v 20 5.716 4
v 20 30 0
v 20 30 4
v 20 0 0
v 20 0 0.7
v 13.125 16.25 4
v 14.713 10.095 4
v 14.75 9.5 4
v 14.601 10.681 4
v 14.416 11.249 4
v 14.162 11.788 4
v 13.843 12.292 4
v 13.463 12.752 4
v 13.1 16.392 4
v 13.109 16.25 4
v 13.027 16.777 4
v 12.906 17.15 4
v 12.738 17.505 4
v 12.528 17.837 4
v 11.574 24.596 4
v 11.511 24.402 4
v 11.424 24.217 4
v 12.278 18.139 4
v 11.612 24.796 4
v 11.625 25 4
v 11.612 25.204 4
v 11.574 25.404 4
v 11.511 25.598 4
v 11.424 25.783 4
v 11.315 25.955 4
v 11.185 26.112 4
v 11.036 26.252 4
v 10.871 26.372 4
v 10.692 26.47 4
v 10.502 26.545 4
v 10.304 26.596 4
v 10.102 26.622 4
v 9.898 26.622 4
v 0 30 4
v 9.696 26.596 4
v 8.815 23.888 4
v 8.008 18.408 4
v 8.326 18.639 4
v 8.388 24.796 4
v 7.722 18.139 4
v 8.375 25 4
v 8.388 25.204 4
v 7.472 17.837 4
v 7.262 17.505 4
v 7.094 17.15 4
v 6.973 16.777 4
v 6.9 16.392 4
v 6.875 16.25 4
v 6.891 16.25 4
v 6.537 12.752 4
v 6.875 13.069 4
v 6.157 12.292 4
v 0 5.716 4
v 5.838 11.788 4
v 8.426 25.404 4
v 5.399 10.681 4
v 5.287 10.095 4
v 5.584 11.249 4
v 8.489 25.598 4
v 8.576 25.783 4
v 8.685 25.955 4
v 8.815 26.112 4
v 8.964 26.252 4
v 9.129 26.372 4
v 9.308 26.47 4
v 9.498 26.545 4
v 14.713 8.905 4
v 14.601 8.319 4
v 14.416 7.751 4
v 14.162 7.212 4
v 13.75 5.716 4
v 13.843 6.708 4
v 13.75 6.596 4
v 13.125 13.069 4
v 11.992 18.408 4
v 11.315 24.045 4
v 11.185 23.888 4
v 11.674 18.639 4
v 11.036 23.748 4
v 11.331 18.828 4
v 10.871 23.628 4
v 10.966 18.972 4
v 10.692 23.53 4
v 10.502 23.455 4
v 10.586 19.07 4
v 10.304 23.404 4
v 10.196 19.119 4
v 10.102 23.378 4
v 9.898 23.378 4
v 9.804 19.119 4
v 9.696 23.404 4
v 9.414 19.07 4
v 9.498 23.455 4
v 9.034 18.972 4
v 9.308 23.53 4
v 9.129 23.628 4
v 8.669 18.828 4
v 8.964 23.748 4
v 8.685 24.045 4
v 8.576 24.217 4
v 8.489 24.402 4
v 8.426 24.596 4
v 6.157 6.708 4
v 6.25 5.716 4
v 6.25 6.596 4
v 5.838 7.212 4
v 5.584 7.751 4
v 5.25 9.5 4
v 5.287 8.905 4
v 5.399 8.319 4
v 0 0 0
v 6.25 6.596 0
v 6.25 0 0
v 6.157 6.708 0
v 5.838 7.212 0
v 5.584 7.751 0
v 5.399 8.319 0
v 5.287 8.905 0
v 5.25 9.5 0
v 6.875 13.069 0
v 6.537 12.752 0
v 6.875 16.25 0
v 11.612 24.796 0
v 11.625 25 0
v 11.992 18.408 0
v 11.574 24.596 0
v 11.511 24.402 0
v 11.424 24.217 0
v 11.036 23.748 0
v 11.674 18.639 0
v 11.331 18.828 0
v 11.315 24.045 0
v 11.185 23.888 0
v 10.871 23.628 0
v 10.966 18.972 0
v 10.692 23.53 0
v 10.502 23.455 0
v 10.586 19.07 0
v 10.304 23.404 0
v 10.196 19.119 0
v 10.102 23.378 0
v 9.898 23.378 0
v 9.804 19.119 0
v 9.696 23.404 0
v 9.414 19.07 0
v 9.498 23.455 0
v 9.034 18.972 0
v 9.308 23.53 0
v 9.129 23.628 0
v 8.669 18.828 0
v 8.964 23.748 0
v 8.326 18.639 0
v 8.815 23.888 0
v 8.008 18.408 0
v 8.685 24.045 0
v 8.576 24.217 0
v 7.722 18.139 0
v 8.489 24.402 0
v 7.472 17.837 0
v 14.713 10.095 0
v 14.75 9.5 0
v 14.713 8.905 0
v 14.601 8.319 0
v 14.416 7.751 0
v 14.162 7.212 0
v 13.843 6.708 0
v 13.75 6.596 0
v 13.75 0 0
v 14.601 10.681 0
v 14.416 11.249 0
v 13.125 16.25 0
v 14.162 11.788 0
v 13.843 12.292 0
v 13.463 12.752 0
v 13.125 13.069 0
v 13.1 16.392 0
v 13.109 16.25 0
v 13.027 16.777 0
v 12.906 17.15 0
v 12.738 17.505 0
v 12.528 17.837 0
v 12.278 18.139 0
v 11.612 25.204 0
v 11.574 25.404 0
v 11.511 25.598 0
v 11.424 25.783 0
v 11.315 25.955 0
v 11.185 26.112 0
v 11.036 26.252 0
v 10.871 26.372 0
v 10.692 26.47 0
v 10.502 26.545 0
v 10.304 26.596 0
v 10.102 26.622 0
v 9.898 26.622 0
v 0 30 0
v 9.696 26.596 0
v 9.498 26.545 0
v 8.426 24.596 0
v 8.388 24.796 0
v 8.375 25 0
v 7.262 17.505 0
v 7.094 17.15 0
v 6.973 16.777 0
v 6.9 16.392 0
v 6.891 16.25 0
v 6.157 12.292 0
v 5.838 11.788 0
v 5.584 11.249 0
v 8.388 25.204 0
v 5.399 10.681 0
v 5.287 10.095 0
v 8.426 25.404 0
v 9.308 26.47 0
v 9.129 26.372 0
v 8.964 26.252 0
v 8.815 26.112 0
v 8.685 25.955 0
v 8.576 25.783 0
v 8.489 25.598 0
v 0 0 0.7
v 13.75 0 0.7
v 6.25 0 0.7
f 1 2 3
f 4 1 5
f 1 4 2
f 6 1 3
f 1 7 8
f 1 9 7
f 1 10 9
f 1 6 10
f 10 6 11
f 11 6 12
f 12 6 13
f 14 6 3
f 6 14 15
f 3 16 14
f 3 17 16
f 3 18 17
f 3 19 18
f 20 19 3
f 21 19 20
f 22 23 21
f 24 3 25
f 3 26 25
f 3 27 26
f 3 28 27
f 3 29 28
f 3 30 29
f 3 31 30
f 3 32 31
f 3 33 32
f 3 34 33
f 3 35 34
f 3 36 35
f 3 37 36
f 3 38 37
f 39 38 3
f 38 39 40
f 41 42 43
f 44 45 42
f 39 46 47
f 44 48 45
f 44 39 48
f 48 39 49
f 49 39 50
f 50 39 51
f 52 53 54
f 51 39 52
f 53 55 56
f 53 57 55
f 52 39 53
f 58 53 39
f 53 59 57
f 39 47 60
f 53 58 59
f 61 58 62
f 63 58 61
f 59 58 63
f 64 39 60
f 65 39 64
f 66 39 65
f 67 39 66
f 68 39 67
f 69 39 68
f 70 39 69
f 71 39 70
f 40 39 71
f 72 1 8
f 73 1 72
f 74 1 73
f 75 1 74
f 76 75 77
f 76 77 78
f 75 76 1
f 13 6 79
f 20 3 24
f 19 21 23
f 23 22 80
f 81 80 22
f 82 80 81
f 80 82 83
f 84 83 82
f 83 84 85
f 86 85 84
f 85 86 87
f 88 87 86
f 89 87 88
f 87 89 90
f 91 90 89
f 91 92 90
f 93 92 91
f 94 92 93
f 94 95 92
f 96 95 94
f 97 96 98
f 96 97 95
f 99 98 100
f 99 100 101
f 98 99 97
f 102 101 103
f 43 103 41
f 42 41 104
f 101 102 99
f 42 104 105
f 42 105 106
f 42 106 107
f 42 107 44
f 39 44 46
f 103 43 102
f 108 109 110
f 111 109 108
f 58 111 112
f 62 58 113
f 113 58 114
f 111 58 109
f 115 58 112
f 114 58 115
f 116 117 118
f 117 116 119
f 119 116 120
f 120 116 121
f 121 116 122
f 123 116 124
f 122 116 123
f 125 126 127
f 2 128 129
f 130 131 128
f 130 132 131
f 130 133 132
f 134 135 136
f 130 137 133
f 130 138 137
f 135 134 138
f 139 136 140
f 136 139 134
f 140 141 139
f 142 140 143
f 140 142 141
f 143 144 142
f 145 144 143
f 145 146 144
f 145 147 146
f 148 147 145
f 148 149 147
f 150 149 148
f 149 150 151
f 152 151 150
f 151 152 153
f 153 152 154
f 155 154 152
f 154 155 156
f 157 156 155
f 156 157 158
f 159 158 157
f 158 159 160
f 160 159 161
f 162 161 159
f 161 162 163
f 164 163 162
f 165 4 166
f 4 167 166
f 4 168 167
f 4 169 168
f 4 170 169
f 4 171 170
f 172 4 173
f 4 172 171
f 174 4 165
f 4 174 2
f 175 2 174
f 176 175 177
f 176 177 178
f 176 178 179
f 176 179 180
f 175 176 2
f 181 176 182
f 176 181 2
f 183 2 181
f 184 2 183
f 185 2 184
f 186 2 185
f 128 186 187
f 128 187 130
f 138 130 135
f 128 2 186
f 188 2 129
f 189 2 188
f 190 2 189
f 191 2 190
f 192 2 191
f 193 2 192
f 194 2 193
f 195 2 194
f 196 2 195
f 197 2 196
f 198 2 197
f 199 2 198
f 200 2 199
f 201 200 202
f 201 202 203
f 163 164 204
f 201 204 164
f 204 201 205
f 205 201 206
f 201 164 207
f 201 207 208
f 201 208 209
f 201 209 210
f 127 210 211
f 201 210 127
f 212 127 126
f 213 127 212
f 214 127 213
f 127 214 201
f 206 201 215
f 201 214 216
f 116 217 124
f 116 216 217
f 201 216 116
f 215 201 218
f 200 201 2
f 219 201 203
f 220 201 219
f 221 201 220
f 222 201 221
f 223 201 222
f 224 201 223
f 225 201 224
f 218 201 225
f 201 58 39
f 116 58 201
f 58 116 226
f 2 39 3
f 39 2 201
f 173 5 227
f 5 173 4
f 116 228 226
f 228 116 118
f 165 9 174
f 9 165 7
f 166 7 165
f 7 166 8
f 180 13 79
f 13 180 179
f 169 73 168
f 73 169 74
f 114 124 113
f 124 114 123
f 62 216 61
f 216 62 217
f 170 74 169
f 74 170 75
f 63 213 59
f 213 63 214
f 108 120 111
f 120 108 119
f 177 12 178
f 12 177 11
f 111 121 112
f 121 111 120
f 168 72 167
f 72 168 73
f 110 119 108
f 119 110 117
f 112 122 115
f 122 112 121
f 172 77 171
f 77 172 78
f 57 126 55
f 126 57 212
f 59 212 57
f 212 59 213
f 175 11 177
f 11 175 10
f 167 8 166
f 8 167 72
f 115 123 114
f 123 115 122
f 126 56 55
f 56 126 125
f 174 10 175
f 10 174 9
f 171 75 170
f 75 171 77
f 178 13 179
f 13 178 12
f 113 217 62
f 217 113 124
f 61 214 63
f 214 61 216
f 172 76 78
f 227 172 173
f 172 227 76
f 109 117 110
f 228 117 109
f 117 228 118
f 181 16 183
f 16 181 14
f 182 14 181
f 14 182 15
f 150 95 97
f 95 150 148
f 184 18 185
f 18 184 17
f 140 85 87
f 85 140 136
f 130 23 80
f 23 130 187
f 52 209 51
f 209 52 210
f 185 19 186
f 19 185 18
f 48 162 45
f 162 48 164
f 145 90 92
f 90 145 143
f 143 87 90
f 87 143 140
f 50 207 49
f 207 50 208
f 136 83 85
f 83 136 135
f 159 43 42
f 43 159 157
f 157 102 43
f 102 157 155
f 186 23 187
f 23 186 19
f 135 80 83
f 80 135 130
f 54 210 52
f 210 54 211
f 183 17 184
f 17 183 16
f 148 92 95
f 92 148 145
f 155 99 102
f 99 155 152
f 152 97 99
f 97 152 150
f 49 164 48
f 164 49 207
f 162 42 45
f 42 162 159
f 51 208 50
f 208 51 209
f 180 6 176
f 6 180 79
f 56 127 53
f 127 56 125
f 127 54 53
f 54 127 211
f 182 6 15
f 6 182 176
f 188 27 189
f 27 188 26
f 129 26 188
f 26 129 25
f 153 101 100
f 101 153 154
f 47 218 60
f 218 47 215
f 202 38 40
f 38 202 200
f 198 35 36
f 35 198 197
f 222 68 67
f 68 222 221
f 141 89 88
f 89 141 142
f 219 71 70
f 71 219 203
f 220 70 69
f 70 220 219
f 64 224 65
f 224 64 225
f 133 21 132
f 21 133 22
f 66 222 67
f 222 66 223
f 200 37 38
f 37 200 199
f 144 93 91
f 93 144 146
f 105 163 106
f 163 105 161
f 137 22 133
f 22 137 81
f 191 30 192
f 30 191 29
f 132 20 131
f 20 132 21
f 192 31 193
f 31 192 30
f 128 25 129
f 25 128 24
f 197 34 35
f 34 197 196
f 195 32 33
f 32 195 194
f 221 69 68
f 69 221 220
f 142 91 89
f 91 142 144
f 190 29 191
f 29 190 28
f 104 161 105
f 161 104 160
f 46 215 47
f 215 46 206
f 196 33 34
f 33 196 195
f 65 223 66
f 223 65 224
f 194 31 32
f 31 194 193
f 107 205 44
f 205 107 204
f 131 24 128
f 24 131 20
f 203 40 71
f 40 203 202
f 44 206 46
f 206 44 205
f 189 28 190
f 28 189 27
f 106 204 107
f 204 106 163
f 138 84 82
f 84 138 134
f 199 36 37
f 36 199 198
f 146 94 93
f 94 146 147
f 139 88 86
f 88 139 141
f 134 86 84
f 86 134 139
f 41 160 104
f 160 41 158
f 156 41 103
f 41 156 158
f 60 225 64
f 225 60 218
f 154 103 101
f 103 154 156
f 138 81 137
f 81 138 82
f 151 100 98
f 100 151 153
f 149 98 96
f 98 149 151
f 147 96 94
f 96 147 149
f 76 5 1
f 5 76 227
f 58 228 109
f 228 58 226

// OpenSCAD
/* This thing describes a Honda outboard motor 'kill cord' clip 
 * Author : David Pye
 * Email :  davidmpye@gmail.com
 * Licence: Creative Commons Attribute-Share-Alike
 * Date: 22/7/2012 
 
 * Details:   There are two sets of dimensions - the 'correct ones' measured from a killcord, and 
 *            the fudged ones which are because my printer prints holes a bit smaller than desired
 *            If your printer is better behaved, uncomment 'correct dimensions' and comment out 
 *            fudged dimensions 
*/

/* Outer sizes of the block */
killcord_x = 20;
killcord_y = 30;
killcord_z = 4;

/* Correct dimensions */
/*centre_hole_diameter = 9.25;
open_slot_width = 7;
closed_slot_diameter = 6;
keyring_hole_diameter = 2.5;
closed_slot_width = 5.75;*/

/* Fudged dimensions for my printer */
centre_hole_diameter = 9.5;
open_slot_width = 7.5;
closed_slot_diameter = 6.25;
keyring_hole_diameter = 3.25;
closed_slot_width = 6.25;



difference() {
	cube([killcord_x,killcord_y, killcord_z]); //The outline of the object
	translate([killcord_x/2, 9.5, -0.001]) cylinder(r=centre_hole_diameter/2, h = 5, $fn=50);  //The main centre hole
	
	translate([(killcord_x/2) - open_slot_width/2,-0.001,-0.001])cube([open_slot_width,9.5,5]); //The open-end of the centre hole
	translate([killcord_x/2, 16,-0.001]) cylinder(r=closed_slot_diameter/2, h = 5, $fn=50); //The closed end
	translate([(killcord_x/2) - closed_slot_width/2 ,10,-0.001]) cube(closed_slot_width,5,5);

	translate([killcord_x / 2, 25,-0.001]) cylinder(r=keyring_hole_diameter/2, h = 5, $fn=50); //Key ring hole

	translate([0,0,0.7]) rotate([30,0,0]) cube([killcord_x, 10, killcord_z]); //Bevel the front edges so it slides into place.
}
